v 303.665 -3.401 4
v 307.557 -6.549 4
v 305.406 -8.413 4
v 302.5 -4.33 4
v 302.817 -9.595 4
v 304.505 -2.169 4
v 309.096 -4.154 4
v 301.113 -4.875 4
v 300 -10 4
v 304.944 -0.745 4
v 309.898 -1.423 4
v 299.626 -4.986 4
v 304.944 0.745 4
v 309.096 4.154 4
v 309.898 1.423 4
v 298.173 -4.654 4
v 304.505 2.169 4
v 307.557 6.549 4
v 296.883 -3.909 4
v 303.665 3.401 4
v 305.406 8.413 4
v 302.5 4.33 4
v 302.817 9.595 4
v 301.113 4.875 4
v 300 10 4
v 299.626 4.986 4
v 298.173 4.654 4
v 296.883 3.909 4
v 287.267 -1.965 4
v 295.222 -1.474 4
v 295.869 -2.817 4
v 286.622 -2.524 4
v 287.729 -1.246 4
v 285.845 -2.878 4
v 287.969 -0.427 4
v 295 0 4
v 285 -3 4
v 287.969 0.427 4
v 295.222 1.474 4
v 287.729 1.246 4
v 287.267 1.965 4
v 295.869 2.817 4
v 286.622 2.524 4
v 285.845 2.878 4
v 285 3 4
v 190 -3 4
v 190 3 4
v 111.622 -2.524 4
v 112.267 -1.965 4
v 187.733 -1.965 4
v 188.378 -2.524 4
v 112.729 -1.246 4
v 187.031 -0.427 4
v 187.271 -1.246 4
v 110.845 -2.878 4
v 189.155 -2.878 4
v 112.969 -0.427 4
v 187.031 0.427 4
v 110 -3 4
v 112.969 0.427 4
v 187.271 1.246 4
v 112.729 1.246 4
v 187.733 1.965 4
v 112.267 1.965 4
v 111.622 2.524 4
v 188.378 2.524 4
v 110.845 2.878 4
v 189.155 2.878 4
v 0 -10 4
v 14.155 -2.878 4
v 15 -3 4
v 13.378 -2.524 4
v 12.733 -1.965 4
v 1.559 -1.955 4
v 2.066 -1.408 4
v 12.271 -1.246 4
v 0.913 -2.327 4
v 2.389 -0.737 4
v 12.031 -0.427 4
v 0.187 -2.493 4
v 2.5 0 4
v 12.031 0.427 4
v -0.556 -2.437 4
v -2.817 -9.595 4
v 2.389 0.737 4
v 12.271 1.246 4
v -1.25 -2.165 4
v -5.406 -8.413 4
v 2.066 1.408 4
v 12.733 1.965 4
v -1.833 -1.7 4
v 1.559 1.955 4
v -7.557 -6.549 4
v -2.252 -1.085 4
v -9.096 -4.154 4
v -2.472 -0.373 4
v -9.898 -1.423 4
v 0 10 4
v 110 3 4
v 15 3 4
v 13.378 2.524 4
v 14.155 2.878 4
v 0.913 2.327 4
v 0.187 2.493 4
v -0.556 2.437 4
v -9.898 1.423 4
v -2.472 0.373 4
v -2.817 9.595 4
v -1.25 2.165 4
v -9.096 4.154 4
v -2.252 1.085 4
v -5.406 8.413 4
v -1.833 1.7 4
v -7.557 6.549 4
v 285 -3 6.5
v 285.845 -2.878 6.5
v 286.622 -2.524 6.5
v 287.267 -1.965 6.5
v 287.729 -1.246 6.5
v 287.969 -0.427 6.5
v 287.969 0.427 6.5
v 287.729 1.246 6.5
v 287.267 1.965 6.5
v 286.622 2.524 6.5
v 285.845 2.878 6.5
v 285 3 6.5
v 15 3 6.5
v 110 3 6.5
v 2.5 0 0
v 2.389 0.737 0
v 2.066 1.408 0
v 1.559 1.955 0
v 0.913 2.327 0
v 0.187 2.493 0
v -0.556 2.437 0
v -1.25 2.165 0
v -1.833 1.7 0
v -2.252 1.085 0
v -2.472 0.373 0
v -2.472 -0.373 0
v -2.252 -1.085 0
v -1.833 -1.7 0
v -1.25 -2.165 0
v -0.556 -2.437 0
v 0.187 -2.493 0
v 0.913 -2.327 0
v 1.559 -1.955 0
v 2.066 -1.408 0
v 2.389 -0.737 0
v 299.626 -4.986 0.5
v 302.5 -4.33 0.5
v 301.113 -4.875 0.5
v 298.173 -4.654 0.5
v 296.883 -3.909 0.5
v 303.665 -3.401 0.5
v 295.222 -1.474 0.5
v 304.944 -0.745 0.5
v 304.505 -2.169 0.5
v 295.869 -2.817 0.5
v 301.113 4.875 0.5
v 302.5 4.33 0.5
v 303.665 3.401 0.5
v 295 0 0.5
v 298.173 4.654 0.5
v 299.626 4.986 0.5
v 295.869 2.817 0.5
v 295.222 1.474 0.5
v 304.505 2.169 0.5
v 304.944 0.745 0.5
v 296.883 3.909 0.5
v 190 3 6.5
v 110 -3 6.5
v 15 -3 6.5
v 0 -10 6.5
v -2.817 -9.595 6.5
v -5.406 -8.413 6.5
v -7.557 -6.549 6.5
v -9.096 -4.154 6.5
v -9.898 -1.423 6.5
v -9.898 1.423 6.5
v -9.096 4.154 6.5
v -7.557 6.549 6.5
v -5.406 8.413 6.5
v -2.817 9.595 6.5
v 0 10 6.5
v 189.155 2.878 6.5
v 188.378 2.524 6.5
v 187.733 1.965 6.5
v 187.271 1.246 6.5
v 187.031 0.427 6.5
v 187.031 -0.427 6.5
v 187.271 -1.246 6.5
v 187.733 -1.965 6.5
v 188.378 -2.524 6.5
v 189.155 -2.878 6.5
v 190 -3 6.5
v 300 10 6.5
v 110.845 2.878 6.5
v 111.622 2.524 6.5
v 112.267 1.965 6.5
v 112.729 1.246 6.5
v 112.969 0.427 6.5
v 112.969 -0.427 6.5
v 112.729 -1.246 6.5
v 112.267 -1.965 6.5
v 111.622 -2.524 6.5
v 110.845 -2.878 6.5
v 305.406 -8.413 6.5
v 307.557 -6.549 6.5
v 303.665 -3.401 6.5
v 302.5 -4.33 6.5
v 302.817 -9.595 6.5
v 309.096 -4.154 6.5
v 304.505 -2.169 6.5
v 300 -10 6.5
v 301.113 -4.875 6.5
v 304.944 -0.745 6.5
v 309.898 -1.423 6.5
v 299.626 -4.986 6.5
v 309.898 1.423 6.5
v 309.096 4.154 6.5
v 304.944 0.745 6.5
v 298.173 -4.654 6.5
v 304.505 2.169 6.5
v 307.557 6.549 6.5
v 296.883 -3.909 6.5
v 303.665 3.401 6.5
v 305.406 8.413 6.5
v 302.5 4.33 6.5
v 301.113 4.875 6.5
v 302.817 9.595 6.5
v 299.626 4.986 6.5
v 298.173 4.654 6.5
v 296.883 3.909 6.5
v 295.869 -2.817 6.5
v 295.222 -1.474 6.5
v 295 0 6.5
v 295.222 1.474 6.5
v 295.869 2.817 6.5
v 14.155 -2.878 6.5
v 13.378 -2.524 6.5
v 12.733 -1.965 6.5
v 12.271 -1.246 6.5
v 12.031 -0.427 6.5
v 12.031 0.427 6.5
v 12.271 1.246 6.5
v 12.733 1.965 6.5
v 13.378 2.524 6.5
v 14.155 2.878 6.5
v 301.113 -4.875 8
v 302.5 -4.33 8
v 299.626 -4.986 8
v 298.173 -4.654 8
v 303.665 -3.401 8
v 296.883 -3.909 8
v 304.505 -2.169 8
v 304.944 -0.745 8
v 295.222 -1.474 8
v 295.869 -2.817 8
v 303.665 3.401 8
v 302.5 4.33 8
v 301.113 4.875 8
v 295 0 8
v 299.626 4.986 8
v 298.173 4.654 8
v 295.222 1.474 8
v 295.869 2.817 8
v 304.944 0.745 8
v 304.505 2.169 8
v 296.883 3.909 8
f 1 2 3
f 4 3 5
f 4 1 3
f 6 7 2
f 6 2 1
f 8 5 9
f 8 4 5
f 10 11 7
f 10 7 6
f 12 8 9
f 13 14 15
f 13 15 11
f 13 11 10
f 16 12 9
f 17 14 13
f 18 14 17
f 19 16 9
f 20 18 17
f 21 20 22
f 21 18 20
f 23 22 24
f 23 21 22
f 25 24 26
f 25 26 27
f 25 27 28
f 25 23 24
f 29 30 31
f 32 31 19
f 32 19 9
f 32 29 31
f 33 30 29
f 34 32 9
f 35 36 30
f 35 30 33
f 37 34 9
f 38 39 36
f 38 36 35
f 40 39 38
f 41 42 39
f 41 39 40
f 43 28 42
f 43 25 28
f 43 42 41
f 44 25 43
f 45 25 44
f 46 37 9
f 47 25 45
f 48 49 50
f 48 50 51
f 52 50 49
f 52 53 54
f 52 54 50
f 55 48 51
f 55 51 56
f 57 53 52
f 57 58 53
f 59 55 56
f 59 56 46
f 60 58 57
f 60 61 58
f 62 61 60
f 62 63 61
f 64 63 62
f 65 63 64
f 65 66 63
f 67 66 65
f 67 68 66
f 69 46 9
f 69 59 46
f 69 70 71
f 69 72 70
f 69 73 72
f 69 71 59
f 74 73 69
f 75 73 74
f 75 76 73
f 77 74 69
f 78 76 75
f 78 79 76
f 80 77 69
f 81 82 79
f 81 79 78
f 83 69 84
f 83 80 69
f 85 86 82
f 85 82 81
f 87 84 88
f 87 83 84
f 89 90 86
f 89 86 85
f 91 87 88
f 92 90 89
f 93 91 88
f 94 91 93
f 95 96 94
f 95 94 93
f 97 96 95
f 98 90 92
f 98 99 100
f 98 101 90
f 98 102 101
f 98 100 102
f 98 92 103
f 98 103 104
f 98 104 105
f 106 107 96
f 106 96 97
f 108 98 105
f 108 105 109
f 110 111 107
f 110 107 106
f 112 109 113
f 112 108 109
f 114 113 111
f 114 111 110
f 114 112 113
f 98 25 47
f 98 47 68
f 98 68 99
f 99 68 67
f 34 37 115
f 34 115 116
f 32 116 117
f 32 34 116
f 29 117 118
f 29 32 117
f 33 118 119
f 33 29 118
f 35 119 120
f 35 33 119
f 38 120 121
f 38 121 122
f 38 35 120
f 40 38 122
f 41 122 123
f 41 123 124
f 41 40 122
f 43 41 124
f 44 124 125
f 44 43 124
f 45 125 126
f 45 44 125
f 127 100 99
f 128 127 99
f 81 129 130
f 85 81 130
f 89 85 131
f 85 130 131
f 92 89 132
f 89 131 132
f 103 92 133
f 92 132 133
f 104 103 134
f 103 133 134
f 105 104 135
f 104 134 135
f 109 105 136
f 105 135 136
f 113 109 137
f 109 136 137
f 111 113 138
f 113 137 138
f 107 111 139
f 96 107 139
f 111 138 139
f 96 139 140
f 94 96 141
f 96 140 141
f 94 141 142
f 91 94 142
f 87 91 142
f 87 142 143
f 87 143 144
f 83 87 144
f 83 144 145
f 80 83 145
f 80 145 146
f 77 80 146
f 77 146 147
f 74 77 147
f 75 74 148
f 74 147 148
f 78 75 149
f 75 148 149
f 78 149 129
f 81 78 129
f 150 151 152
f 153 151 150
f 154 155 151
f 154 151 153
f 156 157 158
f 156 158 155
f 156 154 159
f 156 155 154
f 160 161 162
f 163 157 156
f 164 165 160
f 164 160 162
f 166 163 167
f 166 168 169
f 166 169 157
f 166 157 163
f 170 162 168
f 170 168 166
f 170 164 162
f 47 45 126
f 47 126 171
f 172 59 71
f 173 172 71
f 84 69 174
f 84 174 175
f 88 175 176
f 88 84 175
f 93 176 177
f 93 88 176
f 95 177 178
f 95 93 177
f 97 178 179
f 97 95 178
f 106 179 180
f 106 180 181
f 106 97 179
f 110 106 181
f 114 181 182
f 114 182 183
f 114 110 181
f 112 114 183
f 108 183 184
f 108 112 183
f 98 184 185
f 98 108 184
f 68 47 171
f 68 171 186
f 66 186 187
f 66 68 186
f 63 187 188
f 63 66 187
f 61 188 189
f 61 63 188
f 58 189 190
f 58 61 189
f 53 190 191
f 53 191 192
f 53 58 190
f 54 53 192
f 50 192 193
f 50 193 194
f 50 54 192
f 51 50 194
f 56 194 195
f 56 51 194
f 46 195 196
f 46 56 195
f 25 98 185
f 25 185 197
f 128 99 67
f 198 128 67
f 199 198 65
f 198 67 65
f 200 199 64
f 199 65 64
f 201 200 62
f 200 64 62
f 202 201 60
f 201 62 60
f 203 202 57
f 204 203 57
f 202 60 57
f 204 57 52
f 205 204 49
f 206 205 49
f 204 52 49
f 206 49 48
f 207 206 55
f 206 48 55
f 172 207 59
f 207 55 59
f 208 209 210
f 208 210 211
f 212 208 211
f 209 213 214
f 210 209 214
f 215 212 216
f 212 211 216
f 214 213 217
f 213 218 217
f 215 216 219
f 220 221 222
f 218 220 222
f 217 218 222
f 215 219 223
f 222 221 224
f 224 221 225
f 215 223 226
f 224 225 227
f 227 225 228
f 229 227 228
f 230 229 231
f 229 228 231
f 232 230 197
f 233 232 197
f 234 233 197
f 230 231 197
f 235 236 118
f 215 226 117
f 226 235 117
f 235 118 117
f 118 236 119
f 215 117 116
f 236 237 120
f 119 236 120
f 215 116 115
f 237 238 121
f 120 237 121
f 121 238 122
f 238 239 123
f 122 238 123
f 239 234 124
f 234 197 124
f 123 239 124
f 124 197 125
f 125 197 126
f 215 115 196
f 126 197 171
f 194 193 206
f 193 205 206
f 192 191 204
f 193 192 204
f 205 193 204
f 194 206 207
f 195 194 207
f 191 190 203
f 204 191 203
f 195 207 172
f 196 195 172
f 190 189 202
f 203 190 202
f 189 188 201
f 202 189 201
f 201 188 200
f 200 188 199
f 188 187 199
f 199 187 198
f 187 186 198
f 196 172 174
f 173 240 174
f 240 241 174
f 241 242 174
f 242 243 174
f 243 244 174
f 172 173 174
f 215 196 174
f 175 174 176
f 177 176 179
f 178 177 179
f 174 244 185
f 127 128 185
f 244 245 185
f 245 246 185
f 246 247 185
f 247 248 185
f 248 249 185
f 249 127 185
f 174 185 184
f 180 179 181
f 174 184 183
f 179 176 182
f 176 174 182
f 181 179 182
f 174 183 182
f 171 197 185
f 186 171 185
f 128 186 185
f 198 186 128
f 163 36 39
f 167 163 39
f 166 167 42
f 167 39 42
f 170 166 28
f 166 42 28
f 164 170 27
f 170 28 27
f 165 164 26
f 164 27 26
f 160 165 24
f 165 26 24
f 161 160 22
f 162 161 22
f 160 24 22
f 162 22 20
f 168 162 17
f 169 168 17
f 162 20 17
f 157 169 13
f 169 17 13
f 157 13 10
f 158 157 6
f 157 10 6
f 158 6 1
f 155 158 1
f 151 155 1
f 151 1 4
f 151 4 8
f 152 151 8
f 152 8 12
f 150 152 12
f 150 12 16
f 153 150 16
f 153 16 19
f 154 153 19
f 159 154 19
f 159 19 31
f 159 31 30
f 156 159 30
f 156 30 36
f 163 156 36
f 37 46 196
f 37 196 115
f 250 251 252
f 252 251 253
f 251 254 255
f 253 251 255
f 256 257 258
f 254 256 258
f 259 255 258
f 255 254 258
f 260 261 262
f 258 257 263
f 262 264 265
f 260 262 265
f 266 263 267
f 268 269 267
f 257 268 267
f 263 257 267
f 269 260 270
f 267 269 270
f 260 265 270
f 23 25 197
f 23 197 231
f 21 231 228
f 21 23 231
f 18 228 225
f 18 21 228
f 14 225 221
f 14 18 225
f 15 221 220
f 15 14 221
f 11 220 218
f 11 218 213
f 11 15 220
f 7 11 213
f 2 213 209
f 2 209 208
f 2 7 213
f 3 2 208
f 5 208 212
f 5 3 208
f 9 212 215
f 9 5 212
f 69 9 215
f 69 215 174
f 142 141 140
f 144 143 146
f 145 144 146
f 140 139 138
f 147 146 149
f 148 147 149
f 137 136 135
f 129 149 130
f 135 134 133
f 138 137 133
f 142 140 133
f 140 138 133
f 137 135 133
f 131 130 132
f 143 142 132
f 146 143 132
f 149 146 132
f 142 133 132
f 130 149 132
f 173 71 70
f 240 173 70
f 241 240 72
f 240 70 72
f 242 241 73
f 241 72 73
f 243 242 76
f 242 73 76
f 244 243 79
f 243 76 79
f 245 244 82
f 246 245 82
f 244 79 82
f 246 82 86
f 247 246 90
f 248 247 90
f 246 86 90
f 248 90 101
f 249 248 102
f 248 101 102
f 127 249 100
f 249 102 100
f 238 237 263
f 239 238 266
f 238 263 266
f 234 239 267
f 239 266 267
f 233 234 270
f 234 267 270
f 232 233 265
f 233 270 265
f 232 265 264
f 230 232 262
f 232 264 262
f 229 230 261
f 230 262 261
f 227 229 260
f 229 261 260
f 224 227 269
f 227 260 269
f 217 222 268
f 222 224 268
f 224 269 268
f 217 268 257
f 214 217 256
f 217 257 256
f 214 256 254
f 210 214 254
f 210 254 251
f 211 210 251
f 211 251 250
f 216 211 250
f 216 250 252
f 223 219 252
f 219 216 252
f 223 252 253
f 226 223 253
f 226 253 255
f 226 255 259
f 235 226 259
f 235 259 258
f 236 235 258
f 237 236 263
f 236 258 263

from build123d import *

# Parameters (mm, degrees)
SKETCH1_R                = 2.5
BOSS_EXTRUDE1_DEPTH      = 4
BOSS_EXTRUDE3_DEPTH      = 2.5
BOSS_EXTRUDE4_DEPTH      = 3.5
BOSS_EXTRUDE4_DEPTH_BACK = 4
SKETCH5_R                = 5


with BuildPart() as part:
    # Sketch1 → Boss-Extrude1 (new body)
    with BuildSketch(Plane.XY):
        Circle(SKETCH1_R)
    extrude(amount=BOSS_EXTRUDE1_DEPTH)

    # Sketch3 → Boss-Extrude3 (add)
    with BuildSketch(Plane.XY.offset(4)):
        with BuildLine():
            Line((0, 10), (300, 10))
            ThreePointArc((300, 10), (310, 0), (300, -10))
            Line((300, -10), (0, -10))
            ThreePointArc((0, -10), (-10, 0), (0, 10))
        make_face()
        with BuildLine():
            Line((15, 3), (110, 3))
            ThreePointArc((110, 3), (113, 0), (110, -3))
            Line((110, -3), (15, -3))
            ThreePointArc((15, -3), (12, 0), (15, 3))
        make_face(mode=Mode.SUBTRACT)
        with BuildLine():
            Line((285, 3), (190, 3))
            ThreePointArc((190, 3), (187, 0), (190, -3))
            Line((190, -3), (285, -3))
            ThreePointArc((285, -3), (288, 0), (285, 3))
        make_face(mode=Mode.SUBTRACT)
    extrude(amount=BOSS_EXTRUDE3_DEPTH)

    # Sketch5 → Boss-Extrude4 (add, two sides: drawn at the far end of the back side and taken through both)
    with BuildSketch(Plane(origin=(0, 0, 4), x_dir=(-1, 0, 0), z_dir=(0, 0, -1)).offset(-BOSS_EXTRUDE4_DEPTH_BACK)):
        with Locations((-300, 0)):
            Circle(SKETCH5_R)
    extrude(amount=BOSS_EXTRUDE4_DEPTH + BOSS_EXTRUDE4_DEPTH_BACK)


solid = part.part
